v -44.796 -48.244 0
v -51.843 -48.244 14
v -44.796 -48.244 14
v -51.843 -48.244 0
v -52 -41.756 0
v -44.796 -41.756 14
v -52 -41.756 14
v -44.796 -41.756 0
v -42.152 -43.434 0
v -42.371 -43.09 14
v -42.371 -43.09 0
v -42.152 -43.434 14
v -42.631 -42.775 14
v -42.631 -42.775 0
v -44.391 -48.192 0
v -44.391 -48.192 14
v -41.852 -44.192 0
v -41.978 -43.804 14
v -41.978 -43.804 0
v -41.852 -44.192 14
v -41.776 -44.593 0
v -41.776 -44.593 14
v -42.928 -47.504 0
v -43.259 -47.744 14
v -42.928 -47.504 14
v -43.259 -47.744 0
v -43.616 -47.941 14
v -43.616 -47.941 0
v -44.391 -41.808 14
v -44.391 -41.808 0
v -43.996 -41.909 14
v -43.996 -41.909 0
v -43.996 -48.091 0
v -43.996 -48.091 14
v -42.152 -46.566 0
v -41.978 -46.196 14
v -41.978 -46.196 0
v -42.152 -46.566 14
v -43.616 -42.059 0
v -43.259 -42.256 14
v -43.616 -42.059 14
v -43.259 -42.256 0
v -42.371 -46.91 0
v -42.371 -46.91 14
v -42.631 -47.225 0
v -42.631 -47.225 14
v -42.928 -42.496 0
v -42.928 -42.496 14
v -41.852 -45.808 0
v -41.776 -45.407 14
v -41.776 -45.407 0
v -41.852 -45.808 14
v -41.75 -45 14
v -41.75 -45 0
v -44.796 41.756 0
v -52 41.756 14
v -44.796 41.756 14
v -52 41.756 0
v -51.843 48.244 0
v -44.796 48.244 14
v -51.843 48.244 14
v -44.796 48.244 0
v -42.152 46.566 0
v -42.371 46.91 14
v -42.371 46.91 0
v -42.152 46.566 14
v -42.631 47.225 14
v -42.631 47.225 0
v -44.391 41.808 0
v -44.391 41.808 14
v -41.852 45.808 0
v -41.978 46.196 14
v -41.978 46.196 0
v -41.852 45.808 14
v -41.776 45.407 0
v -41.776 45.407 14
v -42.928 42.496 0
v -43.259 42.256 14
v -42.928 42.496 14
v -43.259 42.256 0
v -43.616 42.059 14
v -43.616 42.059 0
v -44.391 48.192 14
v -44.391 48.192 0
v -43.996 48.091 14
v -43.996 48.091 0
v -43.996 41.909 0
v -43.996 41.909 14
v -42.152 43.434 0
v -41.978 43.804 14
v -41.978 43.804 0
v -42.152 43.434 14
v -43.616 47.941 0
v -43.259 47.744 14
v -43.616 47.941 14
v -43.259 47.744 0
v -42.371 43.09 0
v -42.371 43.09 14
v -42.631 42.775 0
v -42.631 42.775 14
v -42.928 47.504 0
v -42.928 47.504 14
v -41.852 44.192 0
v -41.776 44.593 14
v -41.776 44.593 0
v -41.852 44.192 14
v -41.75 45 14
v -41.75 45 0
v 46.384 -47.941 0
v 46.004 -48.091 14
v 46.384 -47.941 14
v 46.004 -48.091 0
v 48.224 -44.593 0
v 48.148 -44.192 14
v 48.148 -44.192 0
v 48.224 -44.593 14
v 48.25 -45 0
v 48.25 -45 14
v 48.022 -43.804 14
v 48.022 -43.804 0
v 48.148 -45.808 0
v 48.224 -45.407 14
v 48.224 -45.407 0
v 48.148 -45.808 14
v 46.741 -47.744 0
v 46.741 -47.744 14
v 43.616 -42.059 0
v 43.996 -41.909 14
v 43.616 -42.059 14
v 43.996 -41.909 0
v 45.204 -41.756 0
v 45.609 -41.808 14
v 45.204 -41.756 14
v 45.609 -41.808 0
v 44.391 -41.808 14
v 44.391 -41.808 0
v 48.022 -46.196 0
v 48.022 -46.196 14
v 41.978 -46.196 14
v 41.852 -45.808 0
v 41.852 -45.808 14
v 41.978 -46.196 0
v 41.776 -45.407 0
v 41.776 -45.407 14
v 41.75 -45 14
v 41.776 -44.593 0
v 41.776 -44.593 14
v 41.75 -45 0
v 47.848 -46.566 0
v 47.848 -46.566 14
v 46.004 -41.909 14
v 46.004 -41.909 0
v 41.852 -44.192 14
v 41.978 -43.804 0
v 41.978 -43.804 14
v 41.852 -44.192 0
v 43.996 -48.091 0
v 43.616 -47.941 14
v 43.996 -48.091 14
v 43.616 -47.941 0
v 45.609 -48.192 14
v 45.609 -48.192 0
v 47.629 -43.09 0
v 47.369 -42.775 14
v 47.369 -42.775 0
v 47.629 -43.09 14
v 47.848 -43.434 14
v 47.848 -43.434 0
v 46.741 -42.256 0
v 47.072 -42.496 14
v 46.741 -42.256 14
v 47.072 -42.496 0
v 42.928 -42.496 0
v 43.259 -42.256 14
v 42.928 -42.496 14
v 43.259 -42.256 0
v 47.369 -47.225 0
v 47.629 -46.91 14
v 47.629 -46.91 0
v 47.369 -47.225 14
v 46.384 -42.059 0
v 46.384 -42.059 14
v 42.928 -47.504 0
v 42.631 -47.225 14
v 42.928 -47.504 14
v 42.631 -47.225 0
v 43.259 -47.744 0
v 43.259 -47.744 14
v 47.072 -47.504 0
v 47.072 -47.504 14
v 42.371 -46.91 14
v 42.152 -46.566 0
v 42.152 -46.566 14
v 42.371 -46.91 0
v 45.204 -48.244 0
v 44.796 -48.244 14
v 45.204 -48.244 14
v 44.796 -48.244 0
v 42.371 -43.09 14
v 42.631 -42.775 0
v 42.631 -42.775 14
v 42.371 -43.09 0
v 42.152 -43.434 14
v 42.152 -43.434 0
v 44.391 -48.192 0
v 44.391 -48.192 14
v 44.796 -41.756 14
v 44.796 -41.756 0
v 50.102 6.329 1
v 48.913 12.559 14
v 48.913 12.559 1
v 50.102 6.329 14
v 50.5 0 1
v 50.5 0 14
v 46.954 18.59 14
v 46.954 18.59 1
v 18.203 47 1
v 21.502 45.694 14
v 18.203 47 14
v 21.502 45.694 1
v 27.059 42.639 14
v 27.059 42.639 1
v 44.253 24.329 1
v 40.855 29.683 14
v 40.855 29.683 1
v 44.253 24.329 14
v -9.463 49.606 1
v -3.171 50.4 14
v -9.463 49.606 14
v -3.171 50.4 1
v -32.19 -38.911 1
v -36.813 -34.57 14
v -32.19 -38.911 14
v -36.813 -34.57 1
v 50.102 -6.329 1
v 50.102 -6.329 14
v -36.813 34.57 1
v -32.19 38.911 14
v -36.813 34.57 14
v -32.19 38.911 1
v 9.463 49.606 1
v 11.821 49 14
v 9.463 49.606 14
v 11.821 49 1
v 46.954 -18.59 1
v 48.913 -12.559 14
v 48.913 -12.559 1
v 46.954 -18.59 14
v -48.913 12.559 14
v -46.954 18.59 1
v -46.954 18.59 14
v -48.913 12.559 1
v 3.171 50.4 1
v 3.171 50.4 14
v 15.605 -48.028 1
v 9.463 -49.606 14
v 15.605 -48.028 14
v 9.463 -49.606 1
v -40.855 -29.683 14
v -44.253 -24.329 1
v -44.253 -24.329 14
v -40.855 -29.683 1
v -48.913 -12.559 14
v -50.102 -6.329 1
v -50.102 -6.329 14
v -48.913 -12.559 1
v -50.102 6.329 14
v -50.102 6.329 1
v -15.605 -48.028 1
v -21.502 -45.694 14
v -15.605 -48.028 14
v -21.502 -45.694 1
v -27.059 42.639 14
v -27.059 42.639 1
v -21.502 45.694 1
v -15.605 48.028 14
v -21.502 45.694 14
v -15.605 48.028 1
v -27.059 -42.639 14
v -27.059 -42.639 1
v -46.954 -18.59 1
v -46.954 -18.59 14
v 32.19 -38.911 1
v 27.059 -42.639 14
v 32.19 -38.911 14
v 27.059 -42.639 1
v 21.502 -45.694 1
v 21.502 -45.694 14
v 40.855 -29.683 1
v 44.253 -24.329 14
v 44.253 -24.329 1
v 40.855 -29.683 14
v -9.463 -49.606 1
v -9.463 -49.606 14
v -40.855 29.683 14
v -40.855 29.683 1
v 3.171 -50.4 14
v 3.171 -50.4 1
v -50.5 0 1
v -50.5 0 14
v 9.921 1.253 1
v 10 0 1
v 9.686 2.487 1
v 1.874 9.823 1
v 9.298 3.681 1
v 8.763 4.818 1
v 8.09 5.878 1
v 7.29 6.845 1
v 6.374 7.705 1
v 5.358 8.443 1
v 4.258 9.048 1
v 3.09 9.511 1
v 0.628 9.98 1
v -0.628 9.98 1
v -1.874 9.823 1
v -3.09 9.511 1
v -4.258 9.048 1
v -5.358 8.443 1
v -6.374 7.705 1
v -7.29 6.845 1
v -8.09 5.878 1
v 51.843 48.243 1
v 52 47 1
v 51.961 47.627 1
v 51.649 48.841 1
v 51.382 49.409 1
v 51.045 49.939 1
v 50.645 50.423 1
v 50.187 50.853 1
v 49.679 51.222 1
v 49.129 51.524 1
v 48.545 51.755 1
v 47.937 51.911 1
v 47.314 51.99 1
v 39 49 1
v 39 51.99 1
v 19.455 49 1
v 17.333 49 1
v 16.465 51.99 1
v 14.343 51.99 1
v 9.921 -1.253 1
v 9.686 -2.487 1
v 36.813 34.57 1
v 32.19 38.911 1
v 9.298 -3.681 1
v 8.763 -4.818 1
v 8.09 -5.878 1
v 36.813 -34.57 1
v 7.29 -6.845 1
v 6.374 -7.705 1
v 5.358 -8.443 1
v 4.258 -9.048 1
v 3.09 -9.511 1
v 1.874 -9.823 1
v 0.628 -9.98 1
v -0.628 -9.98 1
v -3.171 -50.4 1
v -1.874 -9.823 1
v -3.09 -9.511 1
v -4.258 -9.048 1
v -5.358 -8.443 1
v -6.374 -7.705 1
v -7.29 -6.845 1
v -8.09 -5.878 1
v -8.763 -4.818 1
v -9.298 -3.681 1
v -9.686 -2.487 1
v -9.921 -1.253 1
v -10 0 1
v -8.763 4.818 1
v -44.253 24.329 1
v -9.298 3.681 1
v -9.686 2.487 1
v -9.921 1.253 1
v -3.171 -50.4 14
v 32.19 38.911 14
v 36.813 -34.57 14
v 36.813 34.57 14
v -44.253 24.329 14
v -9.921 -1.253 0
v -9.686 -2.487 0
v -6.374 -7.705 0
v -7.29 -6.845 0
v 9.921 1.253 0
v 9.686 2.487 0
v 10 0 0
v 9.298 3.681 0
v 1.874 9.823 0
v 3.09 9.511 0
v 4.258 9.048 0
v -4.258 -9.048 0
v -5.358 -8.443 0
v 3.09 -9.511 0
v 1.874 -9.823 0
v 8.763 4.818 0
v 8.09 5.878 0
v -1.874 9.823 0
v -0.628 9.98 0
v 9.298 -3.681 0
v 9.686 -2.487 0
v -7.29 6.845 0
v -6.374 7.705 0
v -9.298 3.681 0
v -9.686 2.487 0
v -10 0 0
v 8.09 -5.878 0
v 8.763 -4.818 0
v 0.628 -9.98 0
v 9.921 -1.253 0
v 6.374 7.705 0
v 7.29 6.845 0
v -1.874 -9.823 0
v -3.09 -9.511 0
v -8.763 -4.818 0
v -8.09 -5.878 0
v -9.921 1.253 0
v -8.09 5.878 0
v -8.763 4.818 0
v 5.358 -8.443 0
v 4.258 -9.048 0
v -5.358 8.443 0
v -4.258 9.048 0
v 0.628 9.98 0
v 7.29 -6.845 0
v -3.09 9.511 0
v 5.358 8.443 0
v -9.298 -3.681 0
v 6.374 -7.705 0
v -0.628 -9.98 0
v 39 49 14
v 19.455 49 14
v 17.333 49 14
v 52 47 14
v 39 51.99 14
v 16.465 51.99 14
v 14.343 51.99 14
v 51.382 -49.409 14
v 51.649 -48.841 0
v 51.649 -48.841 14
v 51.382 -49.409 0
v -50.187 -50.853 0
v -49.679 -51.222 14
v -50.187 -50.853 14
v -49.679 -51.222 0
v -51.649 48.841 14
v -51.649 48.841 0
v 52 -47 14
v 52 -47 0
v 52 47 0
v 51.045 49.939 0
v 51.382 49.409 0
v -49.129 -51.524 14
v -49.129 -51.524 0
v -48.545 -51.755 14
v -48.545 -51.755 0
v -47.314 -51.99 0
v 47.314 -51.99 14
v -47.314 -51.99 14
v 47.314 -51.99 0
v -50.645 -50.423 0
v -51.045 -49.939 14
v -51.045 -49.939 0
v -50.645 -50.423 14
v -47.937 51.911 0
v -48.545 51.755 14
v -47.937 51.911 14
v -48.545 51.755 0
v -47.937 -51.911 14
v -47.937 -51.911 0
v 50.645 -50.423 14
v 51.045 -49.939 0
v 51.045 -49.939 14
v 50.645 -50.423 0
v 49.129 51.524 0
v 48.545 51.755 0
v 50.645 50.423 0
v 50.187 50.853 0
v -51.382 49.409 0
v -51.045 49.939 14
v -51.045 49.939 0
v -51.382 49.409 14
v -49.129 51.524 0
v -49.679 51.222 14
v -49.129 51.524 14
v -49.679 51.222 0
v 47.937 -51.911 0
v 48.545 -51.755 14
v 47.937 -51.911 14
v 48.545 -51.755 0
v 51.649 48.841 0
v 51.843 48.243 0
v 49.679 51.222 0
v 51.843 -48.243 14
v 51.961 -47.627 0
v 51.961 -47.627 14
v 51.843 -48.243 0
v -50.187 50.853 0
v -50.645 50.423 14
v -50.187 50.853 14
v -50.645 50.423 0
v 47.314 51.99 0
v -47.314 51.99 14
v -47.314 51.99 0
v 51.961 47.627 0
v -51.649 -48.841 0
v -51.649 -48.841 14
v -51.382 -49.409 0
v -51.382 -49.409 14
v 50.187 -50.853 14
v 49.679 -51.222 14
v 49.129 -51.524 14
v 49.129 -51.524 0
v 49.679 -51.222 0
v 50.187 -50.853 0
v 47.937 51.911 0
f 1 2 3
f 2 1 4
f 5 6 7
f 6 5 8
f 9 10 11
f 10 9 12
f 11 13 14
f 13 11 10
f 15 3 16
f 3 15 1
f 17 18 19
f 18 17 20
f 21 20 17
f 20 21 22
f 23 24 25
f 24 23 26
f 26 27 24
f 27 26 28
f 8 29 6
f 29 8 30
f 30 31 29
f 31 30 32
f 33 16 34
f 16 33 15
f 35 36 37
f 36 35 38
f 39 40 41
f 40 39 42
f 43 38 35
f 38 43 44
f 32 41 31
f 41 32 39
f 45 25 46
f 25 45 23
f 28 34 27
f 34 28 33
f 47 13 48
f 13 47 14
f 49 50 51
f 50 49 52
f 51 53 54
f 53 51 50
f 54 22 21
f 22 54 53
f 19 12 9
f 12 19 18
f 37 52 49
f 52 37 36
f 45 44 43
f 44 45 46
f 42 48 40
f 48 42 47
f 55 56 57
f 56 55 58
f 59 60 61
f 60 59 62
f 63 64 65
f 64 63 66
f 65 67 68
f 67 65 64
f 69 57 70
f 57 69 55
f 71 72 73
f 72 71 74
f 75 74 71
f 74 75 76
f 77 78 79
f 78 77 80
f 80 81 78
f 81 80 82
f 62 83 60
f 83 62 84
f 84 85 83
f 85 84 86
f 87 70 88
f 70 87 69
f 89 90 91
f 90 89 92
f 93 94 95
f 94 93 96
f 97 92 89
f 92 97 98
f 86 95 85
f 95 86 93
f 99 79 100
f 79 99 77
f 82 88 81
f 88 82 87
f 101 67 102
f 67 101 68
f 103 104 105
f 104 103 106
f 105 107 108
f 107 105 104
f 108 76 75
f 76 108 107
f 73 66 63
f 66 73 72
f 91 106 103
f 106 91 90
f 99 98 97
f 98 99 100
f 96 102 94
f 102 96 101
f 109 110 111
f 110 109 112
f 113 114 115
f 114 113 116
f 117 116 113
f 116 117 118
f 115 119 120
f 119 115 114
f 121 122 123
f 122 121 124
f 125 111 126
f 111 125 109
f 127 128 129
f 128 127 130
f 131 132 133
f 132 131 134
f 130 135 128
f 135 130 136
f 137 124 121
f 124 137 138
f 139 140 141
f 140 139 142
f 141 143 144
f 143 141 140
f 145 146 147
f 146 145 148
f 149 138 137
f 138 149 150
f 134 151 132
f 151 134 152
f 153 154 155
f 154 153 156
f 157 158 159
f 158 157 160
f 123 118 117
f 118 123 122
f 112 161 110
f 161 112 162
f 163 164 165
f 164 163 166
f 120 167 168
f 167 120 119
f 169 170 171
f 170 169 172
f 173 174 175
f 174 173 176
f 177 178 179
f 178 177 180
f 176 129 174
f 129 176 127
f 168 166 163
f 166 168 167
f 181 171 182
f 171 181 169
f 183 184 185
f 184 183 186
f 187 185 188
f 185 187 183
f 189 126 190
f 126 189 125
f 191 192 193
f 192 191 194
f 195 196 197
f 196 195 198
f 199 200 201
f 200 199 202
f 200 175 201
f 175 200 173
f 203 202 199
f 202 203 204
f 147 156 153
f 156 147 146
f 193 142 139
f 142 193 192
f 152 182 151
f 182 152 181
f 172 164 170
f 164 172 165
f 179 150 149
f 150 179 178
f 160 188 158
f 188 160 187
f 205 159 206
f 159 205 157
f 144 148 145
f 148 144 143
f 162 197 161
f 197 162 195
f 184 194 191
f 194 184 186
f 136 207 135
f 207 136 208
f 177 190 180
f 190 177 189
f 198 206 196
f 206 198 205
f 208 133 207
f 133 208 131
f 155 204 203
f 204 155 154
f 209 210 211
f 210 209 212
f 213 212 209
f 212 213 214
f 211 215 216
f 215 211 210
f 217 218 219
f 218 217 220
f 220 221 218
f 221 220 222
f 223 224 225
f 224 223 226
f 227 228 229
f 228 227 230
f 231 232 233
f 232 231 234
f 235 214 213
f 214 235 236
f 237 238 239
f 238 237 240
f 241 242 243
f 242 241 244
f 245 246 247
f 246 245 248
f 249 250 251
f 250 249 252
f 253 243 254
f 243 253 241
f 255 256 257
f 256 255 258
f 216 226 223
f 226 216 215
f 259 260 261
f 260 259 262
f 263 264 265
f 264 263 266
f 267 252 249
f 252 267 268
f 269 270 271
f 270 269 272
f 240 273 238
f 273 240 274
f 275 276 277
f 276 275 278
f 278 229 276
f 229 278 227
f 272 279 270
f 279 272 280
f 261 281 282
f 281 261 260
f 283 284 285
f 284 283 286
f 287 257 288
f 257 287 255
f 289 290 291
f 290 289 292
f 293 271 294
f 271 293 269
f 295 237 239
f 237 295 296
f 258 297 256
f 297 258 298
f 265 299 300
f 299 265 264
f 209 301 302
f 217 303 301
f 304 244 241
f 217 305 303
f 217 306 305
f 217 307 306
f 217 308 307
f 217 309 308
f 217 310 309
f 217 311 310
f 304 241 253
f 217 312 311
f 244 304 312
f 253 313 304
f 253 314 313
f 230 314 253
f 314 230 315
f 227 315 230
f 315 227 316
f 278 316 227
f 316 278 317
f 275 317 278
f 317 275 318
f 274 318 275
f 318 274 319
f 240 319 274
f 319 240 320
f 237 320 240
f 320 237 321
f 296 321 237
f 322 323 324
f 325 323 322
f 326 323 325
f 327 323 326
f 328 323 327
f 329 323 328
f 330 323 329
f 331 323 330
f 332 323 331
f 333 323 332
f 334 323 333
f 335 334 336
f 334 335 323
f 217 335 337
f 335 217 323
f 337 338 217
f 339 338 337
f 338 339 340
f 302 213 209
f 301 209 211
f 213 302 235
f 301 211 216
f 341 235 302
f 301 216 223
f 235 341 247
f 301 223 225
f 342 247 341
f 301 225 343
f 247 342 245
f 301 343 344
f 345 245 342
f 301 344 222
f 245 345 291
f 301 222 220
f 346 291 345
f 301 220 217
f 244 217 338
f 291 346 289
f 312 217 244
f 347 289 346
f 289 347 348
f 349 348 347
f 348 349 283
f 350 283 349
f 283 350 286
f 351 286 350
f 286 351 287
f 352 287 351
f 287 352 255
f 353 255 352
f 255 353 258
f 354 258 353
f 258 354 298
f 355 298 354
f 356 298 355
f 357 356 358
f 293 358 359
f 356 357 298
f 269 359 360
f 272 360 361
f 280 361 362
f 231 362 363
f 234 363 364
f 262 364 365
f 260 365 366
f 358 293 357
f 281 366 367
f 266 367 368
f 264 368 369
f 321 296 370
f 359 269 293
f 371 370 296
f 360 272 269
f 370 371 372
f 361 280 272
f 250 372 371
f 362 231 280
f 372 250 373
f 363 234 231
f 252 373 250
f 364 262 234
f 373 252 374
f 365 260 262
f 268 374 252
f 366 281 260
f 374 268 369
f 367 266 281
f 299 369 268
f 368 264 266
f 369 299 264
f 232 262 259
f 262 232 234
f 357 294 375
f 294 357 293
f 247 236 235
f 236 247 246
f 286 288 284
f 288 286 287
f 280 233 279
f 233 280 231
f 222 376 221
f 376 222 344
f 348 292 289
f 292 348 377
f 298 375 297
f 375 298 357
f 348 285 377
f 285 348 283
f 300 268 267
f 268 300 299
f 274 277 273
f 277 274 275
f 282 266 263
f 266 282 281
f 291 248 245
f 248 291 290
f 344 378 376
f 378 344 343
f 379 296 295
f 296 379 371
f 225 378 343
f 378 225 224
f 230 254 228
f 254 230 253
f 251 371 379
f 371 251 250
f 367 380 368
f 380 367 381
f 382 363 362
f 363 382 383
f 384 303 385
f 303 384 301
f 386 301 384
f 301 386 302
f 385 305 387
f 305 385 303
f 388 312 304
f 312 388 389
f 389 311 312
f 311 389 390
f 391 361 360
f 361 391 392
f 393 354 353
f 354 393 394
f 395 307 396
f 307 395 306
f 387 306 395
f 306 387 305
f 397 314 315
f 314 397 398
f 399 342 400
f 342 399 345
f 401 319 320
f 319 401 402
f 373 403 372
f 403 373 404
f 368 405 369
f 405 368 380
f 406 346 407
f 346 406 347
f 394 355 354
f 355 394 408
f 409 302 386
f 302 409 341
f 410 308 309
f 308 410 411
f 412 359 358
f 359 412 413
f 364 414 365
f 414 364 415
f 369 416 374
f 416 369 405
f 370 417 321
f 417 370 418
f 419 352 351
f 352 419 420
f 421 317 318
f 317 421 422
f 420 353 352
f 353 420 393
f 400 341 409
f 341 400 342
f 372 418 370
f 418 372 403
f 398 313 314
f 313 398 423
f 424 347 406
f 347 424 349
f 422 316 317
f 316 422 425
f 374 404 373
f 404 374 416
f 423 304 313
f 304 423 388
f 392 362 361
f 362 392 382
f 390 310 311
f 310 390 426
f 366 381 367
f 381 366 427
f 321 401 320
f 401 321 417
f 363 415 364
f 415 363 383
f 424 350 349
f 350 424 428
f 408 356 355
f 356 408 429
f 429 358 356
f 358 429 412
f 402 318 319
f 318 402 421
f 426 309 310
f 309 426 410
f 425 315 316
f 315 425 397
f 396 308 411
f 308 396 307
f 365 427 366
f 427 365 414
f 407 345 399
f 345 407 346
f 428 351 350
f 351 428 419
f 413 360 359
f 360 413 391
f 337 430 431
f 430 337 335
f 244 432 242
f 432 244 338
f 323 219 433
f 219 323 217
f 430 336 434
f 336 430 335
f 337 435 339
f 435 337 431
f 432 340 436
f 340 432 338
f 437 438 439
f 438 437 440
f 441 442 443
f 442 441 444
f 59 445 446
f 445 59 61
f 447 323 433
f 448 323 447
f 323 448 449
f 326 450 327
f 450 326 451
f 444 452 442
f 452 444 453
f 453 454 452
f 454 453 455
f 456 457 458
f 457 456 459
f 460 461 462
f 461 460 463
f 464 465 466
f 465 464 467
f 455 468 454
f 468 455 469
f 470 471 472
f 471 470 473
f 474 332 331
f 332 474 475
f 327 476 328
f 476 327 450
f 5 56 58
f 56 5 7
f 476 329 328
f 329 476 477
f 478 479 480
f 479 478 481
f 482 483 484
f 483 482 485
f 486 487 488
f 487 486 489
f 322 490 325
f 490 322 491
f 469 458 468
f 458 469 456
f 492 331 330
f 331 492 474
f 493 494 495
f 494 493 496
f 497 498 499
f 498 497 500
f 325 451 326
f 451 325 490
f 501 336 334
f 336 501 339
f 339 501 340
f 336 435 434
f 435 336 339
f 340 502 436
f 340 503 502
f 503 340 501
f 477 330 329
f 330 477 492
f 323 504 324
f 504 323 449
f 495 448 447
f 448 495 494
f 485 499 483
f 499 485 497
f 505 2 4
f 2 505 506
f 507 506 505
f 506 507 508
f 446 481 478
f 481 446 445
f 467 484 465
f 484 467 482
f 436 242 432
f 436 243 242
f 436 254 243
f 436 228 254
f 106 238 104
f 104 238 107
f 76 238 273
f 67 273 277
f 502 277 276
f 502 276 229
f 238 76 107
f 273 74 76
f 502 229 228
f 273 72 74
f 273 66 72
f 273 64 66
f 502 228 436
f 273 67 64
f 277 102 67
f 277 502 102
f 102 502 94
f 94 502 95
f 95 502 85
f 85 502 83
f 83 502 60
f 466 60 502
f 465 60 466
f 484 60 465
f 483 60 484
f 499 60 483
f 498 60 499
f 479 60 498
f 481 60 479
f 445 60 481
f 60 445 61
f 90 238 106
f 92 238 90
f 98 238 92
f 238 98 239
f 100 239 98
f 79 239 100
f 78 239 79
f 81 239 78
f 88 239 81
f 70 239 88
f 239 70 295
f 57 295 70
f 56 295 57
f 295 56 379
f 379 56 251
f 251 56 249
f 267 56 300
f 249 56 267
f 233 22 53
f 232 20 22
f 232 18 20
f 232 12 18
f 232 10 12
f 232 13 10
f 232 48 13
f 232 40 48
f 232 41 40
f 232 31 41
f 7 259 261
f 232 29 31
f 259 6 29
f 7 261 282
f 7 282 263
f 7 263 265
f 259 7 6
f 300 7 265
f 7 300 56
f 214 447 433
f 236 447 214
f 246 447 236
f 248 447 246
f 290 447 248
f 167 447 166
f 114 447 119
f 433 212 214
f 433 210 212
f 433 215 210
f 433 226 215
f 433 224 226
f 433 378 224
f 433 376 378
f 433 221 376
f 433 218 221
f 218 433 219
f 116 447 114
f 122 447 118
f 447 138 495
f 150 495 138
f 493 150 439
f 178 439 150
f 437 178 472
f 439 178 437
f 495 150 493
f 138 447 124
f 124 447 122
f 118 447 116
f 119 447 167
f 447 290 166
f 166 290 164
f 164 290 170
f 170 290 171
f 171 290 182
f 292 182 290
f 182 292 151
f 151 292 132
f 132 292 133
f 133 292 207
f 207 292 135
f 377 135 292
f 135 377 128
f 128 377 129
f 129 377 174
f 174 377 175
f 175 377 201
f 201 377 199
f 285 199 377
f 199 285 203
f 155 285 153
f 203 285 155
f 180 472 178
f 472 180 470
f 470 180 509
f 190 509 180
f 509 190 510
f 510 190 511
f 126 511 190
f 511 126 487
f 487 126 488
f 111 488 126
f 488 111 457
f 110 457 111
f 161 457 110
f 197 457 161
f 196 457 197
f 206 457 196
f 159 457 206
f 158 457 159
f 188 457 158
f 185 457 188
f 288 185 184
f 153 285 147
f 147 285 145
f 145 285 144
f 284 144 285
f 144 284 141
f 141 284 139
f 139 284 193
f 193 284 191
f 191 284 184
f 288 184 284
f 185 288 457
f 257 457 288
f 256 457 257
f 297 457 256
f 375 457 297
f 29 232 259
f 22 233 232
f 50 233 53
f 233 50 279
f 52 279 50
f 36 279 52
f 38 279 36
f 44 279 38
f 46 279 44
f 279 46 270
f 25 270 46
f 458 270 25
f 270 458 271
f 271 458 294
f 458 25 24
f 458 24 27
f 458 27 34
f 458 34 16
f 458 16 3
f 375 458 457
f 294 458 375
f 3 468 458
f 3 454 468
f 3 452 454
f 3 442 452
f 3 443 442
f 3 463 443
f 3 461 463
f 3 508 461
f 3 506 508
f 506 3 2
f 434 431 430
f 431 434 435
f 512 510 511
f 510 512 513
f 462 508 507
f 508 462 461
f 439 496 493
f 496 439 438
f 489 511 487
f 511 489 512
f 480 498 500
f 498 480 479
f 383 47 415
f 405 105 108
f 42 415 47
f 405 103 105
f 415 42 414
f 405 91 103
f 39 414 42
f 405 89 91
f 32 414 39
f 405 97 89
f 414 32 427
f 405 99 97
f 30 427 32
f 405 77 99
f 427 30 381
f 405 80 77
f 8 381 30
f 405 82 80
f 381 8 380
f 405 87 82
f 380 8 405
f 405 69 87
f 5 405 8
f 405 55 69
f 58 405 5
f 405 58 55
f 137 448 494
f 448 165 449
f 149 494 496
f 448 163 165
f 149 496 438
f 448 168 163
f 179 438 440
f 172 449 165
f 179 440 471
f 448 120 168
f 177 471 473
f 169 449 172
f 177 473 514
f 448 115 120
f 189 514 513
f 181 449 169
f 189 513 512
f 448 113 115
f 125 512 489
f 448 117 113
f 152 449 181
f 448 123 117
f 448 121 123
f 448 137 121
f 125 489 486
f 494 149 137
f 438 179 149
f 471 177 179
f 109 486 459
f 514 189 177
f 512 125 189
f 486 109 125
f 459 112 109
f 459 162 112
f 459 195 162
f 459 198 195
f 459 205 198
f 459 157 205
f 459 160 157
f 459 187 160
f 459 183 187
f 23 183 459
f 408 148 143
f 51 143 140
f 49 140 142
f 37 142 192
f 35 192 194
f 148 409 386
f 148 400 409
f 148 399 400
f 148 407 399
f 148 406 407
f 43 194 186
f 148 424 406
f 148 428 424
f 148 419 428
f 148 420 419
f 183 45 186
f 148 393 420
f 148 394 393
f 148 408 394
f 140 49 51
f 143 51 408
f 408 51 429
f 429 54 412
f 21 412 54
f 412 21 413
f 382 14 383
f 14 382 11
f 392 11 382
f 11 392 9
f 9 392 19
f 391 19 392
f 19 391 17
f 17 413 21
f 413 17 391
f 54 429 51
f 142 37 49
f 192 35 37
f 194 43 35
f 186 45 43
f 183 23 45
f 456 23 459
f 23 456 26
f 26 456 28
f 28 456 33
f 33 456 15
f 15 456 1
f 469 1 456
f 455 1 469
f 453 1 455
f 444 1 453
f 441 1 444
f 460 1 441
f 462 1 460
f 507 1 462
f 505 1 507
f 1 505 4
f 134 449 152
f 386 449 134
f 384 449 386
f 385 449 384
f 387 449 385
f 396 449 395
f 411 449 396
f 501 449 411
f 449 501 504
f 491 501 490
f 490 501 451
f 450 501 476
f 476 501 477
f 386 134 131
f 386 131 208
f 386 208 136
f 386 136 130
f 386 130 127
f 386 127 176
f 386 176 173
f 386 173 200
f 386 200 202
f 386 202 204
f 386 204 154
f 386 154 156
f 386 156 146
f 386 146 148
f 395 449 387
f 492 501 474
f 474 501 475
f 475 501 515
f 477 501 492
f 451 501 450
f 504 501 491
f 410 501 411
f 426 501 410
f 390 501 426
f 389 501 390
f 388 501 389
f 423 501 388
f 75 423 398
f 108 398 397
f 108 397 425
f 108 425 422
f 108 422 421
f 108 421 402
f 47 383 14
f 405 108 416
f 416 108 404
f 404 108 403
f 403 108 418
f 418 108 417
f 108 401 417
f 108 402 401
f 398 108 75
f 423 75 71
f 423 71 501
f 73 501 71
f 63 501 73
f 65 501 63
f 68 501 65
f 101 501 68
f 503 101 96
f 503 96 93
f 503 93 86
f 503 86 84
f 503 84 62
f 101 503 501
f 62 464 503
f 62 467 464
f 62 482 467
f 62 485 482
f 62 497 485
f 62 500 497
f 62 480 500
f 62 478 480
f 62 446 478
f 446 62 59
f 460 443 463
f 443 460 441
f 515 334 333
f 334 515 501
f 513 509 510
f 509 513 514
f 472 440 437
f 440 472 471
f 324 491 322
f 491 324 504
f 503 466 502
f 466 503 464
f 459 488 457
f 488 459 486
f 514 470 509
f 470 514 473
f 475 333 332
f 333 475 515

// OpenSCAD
$fn = 50;


difference() {
	union() {
		translate(v = [0, 0, 0]) {
			rotate(a = [0, 0, 0]) {
				hull() {
					translate(v = [-47.0000000000, 47.0000000000, 0]) {
						rotate(a = [0, 0, 0]) {
							translate(v = [0, 0, 0]) {
								rotate(a = [0, 0, 0]) {
									cylinder(h = 14, r = 5);
								}
							}
						}
					}
					translate(v = [47.0000000000, 47.0000000000, 0]) {
						rotate(a = [0, 0, 0]) {
							translate(v = [0, 0, 0]) {
								rotate(a = [0, 0, 0]) {
									cylinder(h = 14, r = 5);
								}
							}
						}
					}
					translate(v = [-47.0000000000, -47.0000000000, 0]) {
						rotate(a = [0, 0, 0]) {
							translate(v = [0, 0, 0]) {
								rotate(a = [0, 0, 0]) {
									cylinder(h = 14, r = 5);
								}
							}
						}
					}
					translate(v = [47.0000000000, -47.0000000000, 0]) {
						rotate(a = [0, 0, 0]) {
							translate(v = [0, 0, 0]) {
								rotate(a = [0, 0, 0]) {
									cylinder(h = 14, r = 5);
								}
							}
						}
					}
				}
			}
		}
	}
	union() {
		translate(v = [-52.5000000000, -45.0000000000, -125]) {
			rotate(a = [0, 0, 0]) {
				hull() {
					translate(v = [7.5000000000, 0, 0]) {
						rotate(a = [0, 0, 0]) {
							translate(v = [0, 0, 0]) {
								rotate(a = [0, 0, 0]) {
									cylinder(h = 250, r = 3.2500000000);
								}
							}
						}
					}
					translate(v = [-7.5000000000, 0, 0]) {
						rotate(a = [0, 0, 0]) {
							translate(v = [0, 0, 0]) {
								rotate(a = [0, 0, 0]) {
									cylinder(h = 250, r = 3.2500000000);
								}
							}
						}
					}
				}
			}
		}
		translate(v = [-52.5000000000, 45.0000000000, -125]) {
			rotate(a = [0, 0, 0]) {
				hull() {
					translate(v = [7.5000000000, 0, 0]) {
						rotate(a = [0, 0, 0]) {
							translate(v = [0, 0, 0]) {
								rotate(a = [0, 0, 0]) {
									cylinder(h = 250, r = 3.2500000000);
								}
							}
						}
					}
					translate(v = [-7.5000000000, 0, 0]) {
						rotate(a = [0, 0, 0]) {
							translate(v = [0, 0, 0]) {
								rotate(a = [0, 0, 0]) {
									cylinder(h = 250, r = 3.2500000000);
								}
							}
						}
					}
				}
			}
		}
		translate(v = [45.0000000000, -45.0000000000, -125.0000000000]) {
			rotate(a = [0, 0, 0]) {
				cylinder(h = 250, r = 3.2500000000);
			}
		}
		translate(v = [0, 0, 1.0000000000]) {
			rotate(a = [0, 0, 0]) {
				cylinder(h = 16, r = 50.5000000000);
			}
		}
		translate(v = [0, 0, -7.0000000000]) {
			rotate(a = [0, 0, 0]) {
				cylinder(h = 14, r = 10.0000000000);
			}
		}
		translate(v = [0.0000000000, 47.0000000000, 1]) {
			rotate(a = [0, 0, 0]) {
				cube(size = [52.0000000000, 2, 16]);
			}
		}
		translate(v = [39.0000000000, 47.0000000000, 1]) {
			rotate(a = [0, 0, 0]) {
				cube(size = [13.0000000000, 5, 16]);
			}
		}
		translate(v = [13.5833333333, 52.7500000000, 1]) {
			rotate(a = [0, 0, -45]) {
				cube(size = [7.5000000000, 1.5000000000, 16]);
			}
		}
	}
}
